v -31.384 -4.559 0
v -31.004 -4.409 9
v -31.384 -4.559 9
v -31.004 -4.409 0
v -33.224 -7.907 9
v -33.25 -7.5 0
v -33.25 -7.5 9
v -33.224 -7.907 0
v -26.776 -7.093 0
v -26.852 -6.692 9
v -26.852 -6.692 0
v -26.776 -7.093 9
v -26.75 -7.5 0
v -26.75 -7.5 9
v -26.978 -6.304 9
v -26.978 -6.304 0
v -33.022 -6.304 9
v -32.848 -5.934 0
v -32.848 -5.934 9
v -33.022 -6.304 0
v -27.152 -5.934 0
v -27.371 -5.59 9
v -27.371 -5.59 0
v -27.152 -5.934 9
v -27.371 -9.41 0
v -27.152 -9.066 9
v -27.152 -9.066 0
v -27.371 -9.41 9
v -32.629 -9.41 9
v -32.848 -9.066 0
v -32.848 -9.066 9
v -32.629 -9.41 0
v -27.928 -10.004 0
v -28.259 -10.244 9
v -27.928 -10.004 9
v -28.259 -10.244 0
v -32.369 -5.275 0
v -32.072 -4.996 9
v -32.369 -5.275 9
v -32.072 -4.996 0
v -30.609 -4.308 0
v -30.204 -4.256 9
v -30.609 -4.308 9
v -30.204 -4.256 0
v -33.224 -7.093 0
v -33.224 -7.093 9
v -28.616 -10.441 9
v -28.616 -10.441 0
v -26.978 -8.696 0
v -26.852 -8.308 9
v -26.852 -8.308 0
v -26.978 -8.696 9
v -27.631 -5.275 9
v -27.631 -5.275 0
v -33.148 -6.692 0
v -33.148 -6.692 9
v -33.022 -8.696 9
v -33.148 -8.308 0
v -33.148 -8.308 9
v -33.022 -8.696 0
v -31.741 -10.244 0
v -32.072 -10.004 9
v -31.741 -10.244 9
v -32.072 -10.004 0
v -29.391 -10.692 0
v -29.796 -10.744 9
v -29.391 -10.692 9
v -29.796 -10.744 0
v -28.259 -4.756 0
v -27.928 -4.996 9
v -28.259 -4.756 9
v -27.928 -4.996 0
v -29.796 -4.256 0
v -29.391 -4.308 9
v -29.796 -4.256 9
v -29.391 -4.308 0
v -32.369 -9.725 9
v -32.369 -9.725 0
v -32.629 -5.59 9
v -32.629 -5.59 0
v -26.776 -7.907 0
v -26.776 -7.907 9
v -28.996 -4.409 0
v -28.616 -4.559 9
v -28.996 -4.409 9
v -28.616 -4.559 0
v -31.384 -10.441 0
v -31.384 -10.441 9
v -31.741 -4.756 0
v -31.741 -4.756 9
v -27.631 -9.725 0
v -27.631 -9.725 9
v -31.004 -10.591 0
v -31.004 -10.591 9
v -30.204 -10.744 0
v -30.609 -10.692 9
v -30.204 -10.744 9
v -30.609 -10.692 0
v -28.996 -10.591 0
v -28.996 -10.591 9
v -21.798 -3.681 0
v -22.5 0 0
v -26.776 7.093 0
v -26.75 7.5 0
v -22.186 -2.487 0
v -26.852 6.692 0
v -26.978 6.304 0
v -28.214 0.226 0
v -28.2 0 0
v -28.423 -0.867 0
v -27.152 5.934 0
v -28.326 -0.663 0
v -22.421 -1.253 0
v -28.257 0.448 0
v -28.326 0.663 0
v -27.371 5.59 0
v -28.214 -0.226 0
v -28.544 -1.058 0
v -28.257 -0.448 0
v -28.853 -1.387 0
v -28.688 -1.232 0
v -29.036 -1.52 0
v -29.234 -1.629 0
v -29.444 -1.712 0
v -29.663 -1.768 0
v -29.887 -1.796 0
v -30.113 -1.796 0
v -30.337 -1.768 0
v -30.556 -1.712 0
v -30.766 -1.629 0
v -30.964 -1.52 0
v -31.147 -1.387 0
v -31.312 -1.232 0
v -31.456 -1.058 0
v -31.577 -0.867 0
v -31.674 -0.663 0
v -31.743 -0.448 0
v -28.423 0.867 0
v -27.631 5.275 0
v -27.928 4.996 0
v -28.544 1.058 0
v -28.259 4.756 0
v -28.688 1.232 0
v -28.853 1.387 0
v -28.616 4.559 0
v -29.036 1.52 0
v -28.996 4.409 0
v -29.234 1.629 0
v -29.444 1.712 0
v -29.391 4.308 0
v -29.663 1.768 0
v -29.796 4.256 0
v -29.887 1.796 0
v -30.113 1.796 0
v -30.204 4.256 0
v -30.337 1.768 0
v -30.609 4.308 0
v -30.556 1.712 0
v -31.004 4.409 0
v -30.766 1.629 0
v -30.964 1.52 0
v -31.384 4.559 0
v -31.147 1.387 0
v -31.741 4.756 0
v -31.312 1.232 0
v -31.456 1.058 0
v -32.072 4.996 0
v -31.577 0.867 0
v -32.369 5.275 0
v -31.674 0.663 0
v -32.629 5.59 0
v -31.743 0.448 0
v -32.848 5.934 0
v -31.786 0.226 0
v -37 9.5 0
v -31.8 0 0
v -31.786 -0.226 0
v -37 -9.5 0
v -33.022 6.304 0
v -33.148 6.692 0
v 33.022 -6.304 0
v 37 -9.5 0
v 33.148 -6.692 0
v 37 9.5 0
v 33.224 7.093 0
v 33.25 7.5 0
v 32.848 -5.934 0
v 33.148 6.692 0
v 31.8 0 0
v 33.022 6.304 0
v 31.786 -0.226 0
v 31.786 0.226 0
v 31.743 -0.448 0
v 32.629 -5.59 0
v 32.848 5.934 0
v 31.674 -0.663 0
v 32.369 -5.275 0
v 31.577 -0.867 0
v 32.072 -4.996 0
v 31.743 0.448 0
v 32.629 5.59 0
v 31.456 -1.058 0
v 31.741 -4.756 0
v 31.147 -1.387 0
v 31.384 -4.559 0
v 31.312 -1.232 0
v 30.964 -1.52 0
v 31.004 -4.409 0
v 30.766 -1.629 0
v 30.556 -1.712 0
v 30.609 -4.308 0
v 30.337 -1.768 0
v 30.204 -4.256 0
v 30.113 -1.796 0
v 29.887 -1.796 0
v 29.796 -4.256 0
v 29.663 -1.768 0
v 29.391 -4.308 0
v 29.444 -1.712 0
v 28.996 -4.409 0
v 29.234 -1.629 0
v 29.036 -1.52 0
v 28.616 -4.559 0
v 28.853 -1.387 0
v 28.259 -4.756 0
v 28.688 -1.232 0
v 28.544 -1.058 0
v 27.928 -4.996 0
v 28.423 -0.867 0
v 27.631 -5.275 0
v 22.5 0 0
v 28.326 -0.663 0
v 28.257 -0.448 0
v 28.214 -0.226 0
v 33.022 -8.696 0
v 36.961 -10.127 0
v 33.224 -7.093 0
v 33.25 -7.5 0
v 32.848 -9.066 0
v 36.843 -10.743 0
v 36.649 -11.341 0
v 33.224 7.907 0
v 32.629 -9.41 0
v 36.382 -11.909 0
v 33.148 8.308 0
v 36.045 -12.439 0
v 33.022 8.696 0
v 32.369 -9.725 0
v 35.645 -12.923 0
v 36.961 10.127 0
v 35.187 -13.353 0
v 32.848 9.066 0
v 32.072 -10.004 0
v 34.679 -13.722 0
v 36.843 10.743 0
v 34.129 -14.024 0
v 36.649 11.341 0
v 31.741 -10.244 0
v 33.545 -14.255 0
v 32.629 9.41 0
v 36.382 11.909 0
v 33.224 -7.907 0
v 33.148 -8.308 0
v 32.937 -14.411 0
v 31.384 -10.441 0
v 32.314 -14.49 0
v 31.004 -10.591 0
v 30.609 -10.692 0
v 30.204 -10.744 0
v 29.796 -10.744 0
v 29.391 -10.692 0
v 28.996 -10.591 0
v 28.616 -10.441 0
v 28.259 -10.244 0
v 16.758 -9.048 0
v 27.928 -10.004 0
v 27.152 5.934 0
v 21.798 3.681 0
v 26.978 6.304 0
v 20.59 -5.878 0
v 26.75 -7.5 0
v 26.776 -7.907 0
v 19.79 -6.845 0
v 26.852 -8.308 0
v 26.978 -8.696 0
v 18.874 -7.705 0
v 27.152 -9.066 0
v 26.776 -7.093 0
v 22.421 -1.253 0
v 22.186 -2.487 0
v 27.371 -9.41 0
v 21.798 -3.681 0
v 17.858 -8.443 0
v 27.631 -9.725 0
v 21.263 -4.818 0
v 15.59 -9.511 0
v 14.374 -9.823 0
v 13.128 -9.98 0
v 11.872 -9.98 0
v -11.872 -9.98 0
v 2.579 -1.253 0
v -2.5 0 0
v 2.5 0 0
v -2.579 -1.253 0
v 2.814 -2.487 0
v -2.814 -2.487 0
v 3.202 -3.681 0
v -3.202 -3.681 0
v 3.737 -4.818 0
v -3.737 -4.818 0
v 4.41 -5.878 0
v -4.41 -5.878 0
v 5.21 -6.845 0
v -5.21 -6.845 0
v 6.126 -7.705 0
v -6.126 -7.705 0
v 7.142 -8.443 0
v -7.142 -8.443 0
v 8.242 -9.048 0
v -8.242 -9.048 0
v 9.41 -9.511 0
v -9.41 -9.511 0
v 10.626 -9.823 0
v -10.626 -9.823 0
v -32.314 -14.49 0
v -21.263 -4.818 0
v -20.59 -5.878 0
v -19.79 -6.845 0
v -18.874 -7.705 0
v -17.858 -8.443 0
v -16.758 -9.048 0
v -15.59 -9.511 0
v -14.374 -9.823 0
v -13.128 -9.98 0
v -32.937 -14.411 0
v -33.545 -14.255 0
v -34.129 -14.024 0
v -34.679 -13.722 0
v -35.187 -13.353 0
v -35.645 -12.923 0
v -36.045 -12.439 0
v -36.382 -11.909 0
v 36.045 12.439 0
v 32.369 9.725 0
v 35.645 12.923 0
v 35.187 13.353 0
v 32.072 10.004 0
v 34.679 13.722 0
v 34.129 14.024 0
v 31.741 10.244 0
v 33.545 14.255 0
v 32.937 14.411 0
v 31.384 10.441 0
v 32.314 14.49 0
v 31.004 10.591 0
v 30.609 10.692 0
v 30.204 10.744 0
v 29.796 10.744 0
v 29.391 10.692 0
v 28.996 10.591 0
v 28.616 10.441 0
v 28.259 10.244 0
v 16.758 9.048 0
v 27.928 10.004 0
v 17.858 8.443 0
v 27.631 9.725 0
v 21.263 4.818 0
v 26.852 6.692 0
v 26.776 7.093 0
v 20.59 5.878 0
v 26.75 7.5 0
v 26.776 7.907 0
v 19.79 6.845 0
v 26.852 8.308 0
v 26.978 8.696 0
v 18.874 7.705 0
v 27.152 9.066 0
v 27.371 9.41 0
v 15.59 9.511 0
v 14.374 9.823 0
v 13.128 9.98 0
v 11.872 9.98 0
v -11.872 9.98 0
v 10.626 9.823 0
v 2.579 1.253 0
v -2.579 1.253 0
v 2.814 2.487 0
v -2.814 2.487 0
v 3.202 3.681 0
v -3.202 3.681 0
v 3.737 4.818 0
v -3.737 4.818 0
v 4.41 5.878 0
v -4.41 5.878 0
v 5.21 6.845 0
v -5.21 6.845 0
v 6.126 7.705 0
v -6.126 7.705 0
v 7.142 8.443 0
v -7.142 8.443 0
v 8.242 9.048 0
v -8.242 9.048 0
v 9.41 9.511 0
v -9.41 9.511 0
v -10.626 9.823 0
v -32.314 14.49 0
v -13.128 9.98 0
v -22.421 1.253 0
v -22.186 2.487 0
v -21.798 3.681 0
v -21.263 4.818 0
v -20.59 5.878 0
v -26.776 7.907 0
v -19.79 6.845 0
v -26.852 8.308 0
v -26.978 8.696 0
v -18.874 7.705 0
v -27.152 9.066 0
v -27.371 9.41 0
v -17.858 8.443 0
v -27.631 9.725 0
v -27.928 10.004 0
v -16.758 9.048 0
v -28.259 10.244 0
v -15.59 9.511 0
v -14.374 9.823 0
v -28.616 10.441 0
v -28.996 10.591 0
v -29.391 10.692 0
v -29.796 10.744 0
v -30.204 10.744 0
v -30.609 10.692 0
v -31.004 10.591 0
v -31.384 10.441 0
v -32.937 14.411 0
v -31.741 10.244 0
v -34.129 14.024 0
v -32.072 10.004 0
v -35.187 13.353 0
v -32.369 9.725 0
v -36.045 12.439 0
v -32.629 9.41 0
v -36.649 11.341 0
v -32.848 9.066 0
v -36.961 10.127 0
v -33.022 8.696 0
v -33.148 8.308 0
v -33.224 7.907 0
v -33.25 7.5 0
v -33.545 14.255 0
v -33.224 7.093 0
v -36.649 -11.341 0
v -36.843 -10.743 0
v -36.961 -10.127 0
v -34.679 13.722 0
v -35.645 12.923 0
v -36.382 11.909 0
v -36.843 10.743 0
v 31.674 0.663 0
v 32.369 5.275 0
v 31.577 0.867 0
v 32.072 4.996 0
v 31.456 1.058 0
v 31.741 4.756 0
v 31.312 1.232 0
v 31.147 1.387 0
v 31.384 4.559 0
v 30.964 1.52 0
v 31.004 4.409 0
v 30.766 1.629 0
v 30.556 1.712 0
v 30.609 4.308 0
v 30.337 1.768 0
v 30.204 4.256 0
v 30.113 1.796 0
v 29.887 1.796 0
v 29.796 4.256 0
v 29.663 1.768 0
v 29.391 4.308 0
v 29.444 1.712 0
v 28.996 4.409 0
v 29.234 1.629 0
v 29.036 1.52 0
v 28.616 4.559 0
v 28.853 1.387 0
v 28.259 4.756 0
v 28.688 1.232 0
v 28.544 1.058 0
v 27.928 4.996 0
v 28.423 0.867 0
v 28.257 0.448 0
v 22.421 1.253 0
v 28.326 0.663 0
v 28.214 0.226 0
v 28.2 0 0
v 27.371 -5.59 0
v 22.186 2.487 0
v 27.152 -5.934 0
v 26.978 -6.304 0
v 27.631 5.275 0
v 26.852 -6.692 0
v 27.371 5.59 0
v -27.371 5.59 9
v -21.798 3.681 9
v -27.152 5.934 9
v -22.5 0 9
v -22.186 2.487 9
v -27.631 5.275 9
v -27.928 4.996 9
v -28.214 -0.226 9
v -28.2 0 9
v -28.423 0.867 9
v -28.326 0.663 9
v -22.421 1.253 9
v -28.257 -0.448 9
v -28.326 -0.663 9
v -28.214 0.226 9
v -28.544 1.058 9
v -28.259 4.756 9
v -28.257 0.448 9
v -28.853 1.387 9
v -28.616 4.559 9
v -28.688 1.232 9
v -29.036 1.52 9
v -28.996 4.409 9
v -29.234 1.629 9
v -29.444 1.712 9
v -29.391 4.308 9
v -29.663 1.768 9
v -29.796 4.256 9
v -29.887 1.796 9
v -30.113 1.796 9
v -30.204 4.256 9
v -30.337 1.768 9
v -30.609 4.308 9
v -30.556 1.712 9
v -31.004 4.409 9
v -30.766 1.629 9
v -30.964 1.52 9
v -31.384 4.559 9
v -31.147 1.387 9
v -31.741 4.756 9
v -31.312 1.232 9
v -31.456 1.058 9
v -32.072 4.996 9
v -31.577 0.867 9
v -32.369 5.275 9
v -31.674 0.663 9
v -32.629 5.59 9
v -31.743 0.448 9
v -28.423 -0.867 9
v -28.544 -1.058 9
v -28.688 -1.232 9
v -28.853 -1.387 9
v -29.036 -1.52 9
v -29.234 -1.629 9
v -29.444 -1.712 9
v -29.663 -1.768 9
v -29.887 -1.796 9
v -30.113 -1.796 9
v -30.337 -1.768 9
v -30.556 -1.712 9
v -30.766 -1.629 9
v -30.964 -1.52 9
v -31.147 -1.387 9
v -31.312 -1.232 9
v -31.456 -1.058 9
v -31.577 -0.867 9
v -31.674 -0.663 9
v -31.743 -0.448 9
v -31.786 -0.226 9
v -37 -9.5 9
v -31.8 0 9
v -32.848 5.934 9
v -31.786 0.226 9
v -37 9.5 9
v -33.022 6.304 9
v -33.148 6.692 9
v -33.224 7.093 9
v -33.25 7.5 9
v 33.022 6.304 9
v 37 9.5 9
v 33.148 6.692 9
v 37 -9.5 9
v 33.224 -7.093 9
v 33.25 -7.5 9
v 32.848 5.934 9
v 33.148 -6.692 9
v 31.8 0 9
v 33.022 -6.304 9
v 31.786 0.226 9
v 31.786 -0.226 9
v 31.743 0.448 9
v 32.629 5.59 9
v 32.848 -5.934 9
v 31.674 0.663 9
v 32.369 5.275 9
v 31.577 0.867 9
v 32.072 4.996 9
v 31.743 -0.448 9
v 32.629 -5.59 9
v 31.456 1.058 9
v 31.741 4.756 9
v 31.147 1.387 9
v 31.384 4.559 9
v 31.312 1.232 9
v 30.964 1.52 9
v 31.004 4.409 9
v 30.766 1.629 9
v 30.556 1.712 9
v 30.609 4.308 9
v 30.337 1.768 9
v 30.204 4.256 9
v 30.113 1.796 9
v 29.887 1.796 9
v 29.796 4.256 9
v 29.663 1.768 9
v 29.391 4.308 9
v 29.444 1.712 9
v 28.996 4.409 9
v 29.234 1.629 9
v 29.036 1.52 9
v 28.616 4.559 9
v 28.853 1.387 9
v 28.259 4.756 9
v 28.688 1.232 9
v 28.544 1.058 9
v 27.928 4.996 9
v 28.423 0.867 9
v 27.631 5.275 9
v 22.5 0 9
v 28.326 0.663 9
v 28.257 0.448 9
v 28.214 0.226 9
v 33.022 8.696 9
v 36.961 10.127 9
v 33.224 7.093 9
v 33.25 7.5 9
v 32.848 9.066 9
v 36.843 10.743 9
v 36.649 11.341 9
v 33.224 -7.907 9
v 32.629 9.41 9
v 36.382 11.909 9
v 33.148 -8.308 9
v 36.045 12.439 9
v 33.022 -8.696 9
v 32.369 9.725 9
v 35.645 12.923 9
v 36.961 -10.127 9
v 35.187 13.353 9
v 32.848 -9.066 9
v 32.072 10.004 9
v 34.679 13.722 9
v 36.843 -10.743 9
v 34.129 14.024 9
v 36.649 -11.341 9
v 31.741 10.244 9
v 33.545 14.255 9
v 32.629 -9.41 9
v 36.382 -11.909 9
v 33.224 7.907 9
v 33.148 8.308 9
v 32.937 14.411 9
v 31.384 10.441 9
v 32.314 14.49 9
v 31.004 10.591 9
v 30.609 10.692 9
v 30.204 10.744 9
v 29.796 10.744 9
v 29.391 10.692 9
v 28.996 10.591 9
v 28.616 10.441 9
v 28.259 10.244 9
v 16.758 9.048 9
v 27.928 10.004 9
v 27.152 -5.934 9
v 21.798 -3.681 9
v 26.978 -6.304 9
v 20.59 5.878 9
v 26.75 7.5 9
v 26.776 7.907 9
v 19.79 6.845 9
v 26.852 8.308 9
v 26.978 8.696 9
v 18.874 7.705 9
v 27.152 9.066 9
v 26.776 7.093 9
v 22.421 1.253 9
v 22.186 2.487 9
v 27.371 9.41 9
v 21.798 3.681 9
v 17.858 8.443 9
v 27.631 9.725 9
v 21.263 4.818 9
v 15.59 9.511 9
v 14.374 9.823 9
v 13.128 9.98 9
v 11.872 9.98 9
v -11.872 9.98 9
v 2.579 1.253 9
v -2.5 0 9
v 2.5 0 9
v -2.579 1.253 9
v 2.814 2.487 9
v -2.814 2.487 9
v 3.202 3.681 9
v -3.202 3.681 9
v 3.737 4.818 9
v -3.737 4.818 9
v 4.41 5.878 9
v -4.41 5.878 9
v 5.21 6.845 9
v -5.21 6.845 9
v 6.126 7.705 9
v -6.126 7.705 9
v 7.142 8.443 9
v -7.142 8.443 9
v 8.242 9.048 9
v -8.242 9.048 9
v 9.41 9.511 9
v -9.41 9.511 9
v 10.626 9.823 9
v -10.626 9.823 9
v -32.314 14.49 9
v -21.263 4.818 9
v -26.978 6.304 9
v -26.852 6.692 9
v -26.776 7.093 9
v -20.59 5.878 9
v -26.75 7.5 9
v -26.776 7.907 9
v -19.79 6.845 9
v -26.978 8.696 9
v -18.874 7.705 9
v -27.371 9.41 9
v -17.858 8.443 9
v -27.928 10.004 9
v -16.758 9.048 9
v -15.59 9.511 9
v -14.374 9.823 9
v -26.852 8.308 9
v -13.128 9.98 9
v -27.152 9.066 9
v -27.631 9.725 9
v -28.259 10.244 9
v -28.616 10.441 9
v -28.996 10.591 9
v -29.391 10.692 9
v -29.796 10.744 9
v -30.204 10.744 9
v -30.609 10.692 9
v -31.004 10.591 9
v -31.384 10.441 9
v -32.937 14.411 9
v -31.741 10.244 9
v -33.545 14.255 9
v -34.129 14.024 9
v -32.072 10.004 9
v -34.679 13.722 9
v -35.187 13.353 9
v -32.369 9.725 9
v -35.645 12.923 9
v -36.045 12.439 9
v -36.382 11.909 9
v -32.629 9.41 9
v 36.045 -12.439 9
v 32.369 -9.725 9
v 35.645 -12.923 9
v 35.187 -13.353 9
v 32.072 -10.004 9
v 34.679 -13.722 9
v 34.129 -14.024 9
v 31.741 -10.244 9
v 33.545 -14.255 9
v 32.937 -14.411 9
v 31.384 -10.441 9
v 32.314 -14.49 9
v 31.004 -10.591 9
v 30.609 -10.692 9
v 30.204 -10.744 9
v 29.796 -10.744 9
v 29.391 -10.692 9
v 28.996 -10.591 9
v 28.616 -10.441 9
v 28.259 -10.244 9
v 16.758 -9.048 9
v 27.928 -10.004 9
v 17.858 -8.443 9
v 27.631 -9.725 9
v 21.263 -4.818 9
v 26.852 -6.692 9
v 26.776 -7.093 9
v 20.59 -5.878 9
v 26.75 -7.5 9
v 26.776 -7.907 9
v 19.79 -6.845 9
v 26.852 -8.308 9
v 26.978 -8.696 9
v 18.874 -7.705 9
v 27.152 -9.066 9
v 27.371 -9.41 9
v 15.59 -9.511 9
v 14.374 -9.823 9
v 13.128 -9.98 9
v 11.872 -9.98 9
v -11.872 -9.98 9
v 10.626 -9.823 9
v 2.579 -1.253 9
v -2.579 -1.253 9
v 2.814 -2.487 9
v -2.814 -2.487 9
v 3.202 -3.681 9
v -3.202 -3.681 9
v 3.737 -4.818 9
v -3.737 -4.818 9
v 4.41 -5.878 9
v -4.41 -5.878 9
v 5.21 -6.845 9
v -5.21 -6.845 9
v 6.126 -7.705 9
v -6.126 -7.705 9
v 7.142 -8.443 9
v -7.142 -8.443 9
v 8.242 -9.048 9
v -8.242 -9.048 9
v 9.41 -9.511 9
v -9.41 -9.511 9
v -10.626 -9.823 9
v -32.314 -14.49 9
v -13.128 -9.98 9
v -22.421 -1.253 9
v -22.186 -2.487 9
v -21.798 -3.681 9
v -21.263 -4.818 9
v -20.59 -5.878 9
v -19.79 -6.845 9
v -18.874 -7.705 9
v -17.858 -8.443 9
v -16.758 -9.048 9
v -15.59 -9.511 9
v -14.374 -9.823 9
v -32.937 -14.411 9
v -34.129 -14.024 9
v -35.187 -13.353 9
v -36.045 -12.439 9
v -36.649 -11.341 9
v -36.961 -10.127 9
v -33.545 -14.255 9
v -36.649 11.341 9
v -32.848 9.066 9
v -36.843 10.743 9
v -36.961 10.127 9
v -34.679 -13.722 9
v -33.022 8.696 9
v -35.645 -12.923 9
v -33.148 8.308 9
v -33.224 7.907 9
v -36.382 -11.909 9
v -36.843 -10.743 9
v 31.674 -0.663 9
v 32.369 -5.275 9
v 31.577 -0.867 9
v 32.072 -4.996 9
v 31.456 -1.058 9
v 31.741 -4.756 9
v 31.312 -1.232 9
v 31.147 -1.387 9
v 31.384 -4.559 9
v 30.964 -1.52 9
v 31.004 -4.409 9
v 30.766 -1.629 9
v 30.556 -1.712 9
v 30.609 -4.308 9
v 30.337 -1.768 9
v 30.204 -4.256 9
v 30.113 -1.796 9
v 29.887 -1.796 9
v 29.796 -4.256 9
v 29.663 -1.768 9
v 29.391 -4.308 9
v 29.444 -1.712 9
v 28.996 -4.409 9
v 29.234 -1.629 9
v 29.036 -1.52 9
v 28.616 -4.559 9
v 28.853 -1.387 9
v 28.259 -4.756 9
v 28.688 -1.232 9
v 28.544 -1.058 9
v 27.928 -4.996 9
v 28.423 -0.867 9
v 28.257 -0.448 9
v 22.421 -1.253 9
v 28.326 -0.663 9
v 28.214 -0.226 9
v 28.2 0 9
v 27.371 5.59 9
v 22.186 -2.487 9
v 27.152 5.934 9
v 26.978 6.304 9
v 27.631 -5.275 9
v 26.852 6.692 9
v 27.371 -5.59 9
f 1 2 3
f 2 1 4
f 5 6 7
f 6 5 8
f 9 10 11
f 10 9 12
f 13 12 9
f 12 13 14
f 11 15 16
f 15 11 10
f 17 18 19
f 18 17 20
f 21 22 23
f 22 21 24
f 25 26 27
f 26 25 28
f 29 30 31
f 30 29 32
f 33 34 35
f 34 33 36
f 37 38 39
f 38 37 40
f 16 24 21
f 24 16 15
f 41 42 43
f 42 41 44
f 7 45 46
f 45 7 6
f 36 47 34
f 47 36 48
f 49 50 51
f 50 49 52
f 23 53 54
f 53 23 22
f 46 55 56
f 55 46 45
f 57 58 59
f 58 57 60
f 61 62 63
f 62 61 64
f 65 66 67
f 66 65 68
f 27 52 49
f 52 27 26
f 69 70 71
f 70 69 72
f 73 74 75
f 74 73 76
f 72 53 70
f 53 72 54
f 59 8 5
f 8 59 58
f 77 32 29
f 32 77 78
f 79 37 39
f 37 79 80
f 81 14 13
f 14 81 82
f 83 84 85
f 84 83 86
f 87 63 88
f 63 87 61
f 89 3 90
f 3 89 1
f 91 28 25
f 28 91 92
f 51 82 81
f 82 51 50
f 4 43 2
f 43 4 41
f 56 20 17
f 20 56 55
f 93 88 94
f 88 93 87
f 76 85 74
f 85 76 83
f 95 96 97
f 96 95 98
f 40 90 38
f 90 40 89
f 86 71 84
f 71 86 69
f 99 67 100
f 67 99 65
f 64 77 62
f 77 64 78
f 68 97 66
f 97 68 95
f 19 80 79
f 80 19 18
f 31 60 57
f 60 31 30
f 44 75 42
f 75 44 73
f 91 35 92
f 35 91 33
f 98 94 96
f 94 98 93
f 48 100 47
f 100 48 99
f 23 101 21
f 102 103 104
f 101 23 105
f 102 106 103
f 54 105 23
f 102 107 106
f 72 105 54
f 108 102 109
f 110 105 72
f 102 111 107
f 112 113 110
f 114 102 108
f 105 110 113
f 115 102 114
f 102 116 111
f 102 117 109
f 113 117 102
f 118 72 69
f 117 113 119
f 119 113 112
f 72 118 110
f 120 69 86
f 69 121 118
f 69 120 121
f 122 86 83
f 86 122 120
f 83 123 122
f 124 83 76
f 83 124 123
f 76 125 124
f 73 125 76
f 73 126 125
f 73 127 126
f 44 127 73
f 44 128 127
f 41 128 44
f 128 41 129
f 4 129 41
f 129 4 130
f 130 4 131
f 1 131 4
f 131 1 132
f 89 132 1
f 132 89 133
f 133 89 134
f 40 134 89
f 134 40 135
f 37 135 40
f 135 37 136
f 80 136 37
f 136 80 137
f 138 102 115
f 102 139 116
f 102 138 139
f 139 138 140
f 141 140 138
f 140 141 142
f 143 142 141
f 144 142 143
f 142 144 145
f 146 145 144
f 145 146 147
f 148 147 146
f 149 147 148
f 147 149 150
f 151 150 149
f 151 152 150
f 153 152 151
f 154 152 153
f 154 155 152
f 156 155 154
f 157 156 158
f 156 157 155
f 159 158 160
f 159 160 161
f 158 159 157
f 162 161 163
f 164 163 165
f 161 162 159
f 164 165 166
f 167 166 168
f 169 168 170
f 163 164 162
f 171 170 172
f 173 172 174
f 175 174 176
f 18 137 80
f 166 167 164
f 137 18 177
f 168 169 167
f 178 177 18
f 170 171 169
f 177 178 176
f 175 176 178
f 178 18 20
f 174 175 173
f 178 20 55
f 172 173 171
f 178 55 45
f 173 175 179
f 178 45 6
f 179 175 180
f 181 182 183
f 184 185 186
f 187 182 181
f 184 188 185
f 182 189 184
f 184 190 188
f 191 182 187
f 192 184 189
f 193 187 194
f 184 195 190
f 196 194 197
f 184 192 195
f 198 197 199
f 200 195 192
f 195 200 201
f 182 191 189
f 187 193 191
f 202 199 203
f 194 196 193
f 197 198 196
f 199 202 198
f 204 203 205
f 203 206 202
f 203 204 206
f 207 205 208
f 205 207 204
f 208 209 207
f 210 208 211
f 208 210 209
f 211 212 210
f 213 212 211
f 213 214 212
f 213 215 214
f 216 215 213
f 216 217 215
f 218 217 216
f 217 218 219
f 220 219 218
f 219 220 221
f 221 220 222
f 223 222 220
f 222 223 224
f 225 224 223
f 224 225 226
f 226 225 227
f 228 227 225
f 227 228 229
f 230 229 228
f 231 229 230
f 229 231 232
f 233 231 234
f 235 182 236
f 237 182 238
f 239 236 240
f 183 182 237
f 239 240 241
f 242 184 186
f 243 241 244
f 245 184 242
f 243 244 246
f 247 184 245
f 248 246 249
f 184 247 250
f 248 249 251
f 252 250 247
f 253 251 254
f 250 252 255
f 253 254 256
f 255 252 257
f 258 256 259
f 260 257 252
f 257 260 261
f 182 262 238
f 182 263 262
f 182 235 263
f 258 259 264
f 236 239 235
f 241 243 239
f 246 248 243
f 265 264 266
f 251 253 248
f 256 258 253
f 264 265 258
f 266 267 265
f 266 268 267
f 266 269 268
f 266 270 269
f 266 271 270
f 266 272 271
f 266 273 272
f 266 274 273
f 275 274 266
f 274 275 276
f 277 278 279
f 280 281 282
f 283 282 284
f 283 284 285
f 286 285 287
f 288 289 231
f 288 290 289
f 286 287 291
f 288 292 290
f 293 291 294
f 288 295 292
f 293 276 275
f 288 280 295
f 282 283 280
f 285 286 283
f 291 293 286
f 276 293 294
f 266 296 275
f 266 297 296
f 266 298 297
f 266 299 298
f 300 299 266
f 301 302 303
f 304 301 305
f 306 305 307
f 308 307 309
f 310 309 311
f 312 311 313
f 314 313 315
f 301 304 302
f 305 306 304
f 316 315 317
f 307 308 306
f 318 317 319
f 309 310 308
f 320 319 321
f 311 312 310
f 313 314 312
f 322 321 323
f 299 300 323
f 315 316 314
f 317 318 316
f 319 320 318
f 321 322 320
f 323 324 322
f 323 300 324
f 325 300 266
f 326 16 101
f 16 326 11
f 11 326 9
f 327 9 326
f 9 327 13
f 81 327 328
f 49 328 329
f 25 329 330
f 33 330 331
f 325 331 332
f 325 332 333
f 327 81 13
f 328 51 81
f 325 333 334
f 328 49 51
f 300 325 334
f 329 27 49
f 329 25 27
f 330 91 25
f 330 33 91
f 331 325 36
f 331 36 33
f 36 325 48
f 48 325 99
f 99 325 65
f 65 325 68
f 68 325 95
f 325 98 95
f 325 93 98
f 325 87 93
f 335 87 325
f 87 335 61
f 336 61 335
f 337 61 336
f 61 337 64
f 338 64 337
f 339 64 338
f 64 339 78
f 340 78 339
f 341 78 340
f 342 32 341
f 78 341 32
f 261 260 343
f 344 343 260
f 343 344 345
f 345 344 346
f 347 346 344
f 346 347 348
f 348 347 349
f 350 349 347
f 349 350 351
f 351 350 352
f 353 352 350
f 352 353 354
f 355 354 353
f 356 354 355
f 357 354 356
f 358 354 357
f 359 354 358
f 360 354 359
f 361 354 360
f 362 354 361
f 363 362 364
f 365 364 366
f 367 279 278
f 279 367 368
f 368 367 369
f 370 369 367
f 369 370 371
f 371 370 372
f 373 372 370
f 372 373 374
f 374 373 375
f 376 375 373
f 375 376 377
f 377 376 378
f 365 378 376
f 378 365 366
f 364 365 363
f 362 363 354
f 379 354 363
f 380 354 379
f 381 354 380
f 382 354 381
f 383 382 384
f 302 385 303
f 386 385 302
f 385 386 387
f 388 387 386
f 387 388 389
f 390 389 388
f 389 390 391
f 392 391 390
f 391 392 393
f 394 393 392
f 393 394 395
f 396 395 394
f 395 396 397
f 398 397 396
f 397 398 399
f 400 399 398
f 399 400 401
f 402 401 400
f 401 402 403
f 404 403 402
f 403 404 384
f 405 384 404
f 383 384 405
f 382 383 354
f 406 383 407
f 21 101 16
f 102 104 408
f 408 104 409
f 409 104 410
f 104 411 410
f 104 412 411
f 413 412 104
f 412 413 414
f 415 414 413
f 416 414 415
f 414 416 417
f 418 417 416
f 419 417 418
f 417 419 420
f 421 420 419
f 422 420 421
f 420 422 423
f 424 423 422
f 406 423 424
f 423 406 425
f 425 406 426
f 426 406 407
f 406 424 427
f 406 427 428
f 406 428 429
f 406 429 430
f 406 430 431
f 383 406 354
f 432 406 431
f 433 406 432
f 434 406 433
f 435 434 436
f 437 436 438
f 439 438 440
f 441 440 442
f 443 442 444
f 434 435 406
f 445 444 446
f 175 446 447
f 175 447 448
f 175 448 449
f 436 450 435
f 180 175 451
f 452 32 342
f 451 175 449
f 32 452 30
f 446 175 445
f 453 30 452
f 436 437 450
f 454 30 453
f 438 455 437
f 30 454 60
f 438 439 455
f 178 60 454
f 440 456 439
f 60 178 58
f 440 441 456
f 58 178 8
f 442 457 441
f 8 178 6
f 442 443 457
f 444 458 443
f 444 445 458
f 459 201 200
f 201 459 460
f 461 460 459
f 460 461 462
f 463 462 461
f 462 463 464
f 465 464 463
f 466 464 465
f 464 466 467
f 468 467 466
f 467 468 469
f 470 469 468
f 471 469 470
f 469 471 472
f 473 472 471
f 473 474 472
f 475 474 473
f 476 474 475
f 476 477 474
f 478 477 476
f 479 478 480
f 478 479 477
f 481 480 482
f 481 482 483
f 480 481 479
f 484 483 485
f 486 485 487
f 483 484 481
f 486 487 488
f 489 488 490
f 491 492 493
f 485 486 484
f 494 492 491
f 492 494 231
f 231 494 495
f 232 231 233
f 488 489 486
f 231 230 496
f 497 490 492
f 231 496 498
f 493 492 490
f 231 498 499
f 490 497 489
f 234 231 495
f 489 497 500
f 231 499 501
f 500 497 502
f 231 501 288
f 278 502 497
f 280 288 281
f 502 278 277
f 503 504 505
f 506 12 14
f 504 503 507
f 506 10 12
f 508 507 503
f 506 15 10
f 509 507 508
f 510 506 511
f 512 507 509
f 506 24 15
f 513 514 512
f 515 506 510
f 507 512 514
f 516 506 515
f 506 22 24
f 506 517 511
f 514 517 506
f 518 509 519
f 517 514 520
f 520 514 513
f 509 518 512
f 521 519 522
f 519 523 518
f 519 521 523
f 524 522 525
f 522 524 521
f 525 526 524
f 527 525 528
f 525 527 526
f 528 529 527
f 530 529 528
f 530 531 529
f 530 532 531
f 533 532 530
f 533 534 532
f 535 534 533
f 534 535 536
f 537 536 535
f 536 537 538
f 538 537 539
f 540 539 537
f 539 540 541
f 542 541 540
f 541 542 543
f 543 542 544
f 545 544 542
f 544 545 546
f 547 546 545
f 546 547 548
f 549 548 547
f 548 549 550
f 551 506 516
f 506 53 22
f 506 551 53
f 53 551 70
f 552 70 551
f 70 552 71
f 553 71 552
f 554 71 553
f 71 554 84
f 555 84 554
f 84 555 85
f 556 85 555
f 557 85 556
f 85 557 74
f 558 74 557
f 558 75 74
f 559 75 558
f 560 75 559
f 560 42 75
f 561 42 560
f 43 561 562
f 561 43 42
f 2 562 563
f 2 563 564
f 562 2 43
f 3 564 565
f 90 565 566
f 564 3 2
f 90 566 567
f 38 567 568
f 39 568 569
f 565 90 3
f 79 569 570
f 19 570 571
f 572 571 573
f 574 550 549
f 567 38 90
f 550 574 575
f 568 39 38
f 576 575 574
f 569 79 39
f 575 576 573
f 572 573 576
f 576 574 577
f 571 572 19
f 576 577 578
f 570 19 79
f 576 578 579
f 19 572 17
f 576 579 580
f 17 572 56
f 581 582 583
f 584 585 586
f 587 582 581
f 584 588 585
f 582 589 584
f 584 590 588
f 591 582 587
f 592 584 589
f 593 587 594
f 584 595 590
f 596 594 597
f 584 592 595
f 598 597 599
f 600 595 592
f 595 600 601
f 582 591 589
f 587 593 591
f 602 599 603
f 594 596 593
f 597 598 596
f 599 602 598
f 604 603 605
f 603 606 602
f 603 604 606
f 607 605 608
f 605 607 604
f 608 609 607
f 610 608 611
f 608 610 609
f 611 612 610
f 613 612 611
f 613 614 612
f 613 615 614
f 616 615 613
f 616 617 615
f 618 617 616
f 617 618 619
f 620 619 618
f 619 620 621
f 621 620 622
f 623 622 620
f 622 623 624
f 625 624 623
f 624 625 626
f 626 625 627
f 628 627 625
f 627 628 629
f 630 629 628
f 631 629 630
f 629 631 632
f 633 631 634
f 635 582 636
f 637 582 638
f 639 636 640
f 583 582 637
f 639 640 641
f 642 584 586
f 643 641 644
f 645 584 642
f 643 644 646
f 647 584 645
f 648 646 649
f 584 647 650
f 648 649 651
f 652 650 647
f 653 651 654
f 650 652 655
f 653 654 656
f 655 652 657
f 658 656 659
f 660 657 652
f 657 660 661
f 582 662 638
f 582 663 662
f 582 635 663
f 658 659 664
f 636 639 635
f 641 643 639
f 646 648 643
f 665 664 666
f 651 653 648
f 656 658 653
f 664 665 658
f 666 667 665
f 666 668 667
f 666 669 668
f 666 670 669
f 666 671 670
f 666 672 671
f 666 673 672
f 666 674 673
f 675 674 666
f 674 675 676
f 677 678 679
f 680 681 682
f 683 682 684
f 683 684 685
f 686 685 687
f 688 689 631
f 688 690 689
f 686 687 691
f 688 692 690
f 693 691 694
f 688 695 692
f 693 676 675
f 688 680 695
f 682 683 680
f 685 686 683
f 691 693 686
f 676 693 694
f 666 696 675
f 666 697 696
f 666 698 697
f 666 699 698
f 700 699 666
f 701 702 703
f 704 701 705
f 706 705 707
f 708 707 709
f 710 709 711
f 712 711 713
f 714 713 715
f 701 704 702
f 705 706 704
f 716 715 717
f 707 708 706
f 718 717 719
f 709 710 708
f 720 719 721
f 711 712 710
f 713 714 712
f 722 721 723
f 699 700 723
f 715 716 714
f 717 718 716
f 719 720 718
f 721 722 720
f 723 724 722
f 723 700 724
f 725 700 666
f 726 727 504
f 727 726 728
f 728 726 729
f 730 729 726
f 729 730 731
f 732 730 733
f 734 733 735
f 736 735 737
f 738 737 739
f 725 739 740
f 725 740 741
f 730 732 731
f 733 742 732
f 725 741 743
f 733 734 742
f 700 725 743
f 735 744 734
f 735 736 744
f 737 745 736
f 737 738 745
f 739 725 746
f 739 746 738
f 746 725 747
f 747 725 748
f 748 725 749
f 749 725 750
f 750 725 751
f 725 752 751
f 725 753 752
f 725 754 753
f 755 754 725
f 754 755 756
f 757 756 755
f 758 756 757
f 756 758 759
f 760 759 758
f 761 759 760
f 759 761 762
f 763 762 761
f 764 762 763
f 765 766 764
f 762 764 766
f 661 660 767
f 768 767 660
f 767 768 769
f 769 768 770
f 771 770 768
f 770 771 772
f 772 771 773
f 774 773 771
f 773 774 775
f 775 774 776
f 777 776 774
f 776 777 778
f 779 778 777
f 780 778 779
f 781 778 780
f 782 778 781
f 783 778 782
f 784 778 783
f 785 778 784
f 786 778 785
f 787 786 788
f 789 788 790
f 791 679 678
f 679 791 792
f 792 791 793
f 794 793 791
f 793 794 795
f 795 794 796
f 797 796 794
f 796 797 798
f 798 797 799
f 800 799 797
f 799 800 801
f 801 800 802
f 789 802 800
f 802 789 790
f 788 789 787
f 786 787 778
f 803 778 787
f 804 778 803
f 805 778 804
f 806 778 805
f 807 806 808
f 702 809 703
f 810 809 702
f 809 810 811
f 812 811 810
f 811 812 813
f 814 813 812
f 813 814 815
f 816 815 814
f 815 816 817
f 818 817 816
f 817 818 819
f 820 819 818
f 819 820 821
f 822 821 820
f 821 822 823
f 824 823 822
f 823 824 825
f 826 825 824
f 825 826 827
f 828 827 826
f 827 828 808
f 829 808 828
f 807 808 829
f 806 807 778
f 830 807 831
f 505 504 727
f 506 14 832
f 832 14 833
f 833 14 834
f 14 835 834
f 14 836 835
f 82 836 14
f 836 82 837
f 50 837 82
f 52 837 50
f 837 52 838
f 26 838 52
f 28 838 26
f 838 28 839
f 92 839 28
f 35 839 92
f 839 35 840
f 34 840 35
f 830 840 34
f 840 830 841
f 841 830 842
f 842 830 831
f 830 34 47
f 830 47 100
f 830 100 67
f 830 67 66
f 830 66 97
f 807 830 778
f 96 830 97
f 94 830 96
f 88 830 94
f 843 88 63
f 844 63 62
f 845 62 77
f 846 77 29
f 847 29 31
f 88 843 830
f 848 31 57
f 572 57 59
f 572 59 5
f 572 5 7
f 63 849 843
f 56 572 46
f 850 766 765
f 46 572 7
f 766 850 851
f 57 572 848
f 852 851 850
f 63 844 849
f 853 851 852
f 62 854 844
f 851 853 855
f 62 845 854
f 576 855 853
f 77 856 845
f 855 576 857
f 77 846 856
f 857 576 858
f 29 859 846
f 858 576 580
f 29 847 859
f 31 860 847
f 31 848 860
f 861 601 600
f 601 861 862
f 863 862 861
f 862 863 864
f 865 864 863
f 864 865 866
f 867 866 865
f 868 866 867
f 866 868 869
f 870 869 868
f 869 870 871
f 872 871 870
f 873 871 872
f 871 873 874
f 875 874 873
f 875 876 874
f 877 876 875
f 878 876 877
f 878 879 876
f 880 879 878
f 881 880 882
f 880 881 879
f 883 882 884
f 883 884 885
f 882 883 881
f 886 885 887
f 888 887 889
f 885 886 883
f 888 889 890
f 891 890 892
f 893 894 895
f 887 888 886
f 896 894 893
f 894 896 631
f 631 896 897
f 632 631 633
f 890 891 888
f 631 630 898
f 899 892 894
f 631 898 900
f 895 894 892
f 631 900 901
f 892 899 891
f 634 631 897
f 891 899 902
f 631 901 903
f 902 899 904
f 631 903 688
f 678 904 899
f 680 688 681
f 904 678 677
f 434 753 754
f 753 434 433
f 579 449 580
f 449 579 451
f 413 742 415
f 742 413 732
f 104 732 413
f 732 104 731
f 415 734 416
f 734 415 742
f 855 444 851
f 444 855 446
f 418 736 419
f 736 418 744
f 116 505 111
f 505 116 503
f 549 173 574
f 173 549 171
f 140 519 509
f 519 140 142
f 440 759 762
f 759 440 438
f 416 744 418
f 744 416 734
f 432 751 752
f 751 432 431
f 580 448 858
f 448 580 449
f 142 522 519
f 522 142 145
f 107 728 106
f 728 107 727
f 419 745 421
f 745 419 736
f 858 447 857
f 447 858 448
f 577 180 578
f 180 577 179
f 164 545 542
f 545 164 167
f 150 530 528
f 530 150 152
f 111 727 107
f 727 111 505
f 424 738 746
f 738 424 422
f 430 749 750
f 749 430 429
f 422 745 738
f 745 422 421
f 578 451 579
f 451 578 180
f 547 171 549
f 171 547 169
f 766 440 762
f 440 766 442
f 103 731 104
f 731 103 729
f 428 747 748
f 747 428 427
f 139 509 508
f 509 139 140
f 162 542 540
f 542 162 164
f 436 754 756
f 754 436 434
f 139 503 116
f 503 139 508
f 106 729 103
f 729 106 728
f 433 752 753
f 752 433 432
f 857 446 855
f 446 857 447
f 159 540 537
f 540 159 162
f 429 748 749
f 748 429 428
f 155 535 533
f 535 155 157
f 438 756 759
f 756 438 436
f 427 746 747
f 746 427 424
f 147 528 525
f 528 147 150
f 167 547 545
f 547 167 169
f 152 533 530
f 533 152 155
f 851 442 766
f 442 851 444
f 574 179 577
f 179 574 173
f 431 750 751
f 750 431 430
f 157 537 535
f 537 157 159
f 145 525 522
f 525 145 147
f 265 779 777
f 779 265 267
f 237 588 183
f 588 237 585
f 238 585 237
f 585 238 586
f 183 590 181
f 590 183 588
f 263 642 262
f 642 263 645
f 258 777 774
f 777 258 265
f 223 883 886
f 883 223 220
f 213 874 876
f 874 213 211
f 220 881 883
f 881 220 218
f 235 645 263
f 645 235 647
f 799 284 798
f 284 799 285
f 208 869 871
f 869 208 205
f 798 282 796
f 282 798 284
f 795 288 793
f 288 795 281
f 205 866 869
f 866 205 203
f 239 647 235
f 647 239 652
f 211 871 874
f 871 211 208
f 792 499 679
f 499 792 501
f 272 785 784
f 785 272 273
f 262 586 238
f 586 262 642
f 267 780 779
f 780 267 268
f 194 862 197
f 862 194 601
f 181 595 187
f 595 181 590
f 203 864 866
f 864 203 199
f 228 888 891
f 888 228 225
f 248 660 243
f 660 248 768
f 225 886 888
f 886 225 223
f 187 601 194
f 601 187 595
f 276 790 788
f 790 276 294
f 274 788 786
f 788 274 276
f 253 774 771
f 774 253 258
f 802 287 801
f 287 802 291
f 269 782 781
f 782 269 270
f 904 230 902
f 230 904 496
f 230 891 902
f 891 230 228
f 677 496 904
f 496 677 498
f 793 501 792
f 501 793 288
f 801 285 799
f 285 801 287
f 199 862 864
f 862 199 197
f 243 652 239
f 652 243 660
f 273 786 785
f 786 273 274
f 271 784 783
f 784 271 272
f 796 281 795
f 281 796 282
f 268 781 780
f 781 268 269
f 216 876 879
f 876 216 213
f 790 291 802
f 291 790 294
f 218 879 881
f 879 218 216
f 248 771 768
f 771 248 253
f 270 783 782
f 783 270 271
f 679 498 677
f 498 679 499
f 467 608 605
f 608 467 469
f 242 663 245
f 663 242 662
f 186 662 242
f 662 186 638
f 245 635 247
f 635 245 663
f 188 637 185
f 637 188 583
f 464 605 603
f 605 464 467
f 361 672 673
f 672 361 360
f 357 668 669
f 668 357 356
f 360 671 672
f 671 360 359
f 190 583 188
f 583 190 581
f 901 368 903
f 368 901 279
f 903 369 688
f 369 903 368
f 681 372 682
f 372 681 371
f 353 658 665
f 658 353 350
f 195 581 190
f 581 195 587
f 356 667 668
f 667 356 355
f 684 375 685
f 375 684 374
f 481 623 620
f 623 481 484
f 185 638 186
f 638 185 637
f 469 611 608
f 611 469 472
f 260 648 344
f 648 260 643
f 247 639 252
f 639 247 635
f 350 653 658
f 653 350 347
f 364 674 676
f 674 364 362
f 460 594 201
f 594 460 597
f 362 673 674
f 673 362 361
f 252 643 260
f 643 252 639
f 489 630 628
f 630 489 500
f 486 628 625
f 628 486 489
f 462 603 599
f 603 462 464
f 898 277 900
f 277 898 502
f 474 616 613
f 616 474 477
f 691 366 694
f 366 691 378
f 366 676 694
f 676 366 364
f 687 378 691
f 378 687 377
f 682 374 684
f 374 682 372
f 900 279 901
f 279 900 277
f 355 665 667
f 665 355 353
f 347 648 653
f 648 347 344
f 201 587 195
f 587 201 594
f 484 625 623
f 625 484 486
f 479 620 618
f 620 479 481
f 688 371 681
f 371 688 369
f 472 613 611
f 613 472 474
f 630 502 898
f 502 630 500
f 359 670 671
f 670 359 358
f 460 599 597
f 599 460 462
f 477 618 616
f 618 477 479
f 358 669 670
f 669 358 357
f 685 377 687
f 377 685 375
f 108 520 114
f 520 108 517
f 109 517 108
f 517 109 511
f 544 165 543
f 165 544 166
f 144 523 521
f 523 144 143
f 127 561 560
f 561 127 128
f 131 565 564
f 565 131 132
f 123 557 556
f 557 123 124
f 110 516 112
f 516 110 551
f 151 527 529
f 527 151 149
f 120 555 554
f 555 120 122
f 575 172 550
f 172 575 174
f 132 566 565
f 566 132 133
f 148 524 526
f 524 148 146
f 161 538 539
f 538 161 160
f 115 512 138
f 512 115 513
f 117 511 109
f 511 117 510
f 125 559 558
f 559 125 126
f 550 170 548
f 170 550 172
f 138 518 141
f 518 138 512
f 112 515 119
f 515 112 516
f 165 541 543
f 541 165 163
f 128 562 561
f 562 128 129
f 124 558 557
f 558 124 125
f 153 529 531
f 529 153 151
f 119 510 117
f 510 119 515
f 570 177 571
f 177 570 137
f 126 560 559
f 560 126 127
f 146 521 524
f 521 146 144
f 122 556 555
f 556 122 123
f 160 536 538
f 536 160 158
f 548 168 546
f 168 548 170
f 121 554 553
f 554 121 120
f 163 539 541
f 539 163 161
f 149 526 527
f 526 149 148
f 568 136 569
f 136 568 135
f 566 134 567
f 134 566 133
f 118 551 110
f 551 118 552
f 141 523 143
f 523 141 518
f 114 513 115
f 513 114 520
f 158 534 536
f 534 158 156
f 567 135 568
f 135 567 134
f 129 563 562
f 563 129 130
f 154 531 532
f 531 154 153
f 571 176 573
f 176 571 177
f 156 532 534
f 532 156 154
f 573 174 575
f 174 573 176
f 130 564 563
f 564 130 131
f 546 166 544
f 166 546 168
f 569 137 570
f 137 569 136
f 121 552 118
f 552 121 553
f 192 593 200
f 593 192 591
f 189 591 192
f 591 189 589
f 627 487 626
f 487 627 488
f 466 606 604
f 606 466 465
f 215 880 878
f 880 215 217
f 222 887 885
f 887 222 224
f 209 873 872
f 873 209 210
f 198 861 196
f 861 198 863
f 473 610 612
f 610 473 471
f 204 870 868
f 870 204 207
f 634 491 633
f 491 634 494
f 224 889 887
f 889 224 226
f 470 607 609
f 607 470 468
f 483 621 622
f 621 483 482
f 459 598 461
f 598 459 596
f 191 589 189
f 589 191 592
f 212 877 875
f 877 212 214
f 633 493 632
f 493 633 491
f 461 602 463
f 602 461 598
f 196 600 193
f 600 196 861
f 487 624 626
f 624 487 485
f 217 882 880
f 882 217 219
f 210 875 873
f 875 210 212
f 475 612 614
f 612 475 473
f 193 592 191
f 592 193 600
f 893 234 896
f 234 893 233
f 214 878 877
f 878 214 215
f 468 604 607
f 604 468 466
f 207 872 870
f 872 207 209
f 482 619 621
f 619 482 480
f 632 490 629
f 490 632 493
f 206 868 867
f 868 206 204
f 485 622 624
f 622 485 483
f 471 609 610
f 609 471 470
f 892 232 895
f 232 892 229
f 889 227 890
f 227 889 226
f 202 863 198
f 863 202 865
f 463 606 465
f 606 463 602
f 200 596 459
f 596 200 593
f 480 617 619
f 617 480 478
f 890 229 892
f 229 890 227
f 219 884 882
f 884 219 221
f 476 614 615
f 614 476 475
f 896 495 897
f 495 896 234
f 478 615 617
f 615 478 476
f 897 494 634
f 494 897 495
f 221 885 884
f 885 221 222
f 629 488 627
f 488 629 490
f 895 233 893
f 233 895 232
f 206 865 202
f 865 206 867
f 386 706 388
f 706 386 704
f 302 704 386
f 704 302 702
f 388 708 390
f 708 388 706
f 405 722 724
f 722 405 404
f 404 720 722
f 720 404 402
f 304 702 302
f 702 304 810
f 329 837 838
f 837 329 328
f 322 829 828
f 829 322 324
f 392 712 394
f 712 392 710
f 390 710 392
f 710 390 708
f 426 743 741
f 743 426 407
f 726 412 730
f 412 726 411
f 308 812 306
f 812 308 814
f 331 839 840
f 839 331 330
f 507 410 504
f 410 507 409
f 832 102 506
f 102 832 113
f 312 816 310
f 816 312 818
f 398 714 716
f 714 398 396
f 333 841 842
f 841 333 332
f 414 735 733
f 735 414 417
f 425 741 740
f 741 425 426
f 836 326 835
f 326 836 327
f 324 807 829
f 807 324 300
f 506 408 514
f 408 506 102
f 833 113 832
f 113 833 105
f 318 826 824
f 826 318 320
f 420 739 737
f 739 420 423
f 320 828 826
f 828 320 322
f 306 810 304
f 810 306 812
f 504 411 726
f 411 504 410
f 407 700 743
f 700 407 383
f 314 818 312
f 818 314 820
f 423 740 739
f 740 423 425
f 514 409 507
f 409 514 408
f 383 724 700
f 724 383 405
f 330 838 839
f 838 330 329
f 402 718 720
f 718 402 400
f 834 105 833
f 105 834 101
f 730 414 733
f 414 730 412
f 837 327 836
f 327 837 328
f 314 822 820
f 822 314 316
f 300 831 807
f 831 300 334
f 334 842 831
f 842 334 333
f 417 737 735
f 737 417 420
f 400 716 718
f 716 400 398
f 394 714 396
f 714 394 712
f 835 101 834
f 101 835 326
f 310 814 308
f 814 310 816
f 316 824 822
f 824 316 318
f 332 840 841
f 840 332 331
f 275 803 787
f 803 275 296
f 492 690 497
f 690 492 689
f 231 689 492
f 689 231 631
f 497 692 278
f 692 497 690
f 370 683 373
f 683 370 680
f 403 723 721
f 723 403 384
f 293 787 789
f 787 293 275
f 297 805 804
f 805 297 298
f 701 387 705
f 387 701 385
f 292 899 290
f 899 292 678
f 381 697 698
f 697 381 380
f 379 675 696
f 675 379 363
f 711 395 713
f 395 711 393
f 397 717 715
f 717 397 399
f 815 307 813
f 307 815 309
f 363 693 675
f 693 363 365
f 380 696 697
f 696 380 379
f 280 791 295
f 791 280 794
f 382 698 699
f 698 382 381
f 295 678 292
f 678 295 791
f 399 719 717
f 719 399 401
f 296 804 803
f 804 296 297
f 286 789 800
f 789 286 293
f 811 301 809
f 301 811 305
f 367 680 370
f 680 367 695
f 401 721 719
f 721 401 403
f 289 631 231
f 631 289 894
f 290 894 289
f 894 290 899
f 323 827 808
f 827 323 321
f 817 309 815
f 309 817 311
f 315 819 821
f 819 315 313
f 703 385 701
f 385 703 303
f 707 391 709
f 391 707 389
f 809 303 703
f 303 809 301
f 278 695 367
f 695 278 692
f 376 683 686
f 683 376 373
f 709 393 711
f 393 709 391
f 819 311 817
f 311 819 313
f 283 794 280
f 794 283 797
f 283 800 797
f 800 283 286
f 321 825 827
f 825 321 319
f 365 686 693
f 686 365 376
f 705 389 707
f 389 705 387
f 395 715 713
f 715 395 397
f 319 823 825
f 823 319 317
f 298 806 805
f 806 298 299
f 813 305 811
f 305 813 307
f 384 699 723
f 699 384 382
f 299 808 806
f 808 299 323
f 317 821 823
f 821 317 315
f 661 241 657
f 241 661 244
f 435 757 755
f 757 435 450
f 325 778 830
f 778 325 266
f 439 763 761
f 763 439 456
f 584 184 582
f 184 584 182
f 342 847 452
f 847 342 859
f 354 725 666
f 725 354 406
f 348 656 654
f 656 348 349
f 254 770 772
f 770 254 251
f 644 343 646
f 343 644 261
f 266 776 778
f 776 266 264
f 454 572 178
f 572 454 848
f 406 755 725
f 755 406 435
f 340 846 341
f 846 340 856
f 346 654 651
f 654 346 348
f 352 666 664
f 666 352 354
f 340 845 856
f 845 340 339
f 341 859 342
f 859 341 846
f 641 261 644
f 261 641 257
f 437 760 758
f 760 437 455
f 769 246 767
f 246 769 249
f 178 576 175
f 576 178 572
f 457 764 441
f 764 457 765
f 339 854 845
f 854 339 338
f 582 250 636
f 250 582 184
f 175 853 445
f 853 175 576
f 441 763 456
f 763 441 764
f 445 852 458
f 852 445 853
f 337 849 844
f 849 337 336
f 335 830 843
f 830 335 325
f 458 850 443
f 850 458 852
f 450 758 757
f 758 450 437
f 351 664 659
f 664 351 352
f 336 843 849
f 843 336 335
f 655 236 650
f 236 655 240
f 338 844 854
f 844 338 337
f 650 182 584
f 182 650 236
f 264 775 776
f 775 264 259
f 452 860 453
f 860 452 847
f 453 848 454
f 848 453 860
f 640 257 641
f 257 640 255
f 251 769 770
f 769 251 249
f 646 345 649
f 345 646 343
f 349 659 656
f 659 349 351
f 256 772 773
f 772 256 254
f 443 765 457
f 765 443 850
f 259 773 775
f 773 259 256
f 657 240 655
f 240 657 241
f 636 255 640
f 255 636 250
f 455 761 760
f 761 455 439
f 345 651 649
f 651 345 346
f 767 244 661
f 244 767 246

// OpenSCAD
$fn = 50;

difference() {
	union() {
		hull() {
			translate(v = [-32.0, 9.5, 0]) {
				cylinder(h = 9, r = 5);
			}
			translate(v = [32.0, 9.5, 0]) {
				cylinder(h = 9, r = 5);
			}
			translate(v = [-32.0, -9.5, 0]) {
				cylinder(h = 9, r = 5);
			}
			translate(v = [32.0, -9.5, 0]) {
				cylinder(h = 9, r = 5);
			}
		}
	}
	union() {
		translate(v = [-30.0, -7.5, 0]) {
			cylinder(h = 9, r = 3.25);
		}
		translate(v = [-30.0, 7.5, 0]) {
			cylinder(h = 9, r = 3.25);
		}
		translate(v = [30.0, -7.5, 0]) {
			cylinder(h = 9, r = 3.25);
		}
		translate(v = [30.0, 7.5, 0]) {
			cylinder(h = 9, r = 3.25);
		}
		translate(v = [-30.0, 0.0, 0]) {
			cylinder(h = 9, r = 1.8);
		}
		translate(v = [30.0, 0.0, 0]) {
			cylinder(h = 9, r = 1.8);
		}
		translate(v = [-12.5, 0, 0.0]) {
			cylinder(h = 9, r = 10.0);
		}
		translate(v = [12.5, 0, 0.0]) {
			cylinder(h = 9, r = 10.0);
		}
	}
}
